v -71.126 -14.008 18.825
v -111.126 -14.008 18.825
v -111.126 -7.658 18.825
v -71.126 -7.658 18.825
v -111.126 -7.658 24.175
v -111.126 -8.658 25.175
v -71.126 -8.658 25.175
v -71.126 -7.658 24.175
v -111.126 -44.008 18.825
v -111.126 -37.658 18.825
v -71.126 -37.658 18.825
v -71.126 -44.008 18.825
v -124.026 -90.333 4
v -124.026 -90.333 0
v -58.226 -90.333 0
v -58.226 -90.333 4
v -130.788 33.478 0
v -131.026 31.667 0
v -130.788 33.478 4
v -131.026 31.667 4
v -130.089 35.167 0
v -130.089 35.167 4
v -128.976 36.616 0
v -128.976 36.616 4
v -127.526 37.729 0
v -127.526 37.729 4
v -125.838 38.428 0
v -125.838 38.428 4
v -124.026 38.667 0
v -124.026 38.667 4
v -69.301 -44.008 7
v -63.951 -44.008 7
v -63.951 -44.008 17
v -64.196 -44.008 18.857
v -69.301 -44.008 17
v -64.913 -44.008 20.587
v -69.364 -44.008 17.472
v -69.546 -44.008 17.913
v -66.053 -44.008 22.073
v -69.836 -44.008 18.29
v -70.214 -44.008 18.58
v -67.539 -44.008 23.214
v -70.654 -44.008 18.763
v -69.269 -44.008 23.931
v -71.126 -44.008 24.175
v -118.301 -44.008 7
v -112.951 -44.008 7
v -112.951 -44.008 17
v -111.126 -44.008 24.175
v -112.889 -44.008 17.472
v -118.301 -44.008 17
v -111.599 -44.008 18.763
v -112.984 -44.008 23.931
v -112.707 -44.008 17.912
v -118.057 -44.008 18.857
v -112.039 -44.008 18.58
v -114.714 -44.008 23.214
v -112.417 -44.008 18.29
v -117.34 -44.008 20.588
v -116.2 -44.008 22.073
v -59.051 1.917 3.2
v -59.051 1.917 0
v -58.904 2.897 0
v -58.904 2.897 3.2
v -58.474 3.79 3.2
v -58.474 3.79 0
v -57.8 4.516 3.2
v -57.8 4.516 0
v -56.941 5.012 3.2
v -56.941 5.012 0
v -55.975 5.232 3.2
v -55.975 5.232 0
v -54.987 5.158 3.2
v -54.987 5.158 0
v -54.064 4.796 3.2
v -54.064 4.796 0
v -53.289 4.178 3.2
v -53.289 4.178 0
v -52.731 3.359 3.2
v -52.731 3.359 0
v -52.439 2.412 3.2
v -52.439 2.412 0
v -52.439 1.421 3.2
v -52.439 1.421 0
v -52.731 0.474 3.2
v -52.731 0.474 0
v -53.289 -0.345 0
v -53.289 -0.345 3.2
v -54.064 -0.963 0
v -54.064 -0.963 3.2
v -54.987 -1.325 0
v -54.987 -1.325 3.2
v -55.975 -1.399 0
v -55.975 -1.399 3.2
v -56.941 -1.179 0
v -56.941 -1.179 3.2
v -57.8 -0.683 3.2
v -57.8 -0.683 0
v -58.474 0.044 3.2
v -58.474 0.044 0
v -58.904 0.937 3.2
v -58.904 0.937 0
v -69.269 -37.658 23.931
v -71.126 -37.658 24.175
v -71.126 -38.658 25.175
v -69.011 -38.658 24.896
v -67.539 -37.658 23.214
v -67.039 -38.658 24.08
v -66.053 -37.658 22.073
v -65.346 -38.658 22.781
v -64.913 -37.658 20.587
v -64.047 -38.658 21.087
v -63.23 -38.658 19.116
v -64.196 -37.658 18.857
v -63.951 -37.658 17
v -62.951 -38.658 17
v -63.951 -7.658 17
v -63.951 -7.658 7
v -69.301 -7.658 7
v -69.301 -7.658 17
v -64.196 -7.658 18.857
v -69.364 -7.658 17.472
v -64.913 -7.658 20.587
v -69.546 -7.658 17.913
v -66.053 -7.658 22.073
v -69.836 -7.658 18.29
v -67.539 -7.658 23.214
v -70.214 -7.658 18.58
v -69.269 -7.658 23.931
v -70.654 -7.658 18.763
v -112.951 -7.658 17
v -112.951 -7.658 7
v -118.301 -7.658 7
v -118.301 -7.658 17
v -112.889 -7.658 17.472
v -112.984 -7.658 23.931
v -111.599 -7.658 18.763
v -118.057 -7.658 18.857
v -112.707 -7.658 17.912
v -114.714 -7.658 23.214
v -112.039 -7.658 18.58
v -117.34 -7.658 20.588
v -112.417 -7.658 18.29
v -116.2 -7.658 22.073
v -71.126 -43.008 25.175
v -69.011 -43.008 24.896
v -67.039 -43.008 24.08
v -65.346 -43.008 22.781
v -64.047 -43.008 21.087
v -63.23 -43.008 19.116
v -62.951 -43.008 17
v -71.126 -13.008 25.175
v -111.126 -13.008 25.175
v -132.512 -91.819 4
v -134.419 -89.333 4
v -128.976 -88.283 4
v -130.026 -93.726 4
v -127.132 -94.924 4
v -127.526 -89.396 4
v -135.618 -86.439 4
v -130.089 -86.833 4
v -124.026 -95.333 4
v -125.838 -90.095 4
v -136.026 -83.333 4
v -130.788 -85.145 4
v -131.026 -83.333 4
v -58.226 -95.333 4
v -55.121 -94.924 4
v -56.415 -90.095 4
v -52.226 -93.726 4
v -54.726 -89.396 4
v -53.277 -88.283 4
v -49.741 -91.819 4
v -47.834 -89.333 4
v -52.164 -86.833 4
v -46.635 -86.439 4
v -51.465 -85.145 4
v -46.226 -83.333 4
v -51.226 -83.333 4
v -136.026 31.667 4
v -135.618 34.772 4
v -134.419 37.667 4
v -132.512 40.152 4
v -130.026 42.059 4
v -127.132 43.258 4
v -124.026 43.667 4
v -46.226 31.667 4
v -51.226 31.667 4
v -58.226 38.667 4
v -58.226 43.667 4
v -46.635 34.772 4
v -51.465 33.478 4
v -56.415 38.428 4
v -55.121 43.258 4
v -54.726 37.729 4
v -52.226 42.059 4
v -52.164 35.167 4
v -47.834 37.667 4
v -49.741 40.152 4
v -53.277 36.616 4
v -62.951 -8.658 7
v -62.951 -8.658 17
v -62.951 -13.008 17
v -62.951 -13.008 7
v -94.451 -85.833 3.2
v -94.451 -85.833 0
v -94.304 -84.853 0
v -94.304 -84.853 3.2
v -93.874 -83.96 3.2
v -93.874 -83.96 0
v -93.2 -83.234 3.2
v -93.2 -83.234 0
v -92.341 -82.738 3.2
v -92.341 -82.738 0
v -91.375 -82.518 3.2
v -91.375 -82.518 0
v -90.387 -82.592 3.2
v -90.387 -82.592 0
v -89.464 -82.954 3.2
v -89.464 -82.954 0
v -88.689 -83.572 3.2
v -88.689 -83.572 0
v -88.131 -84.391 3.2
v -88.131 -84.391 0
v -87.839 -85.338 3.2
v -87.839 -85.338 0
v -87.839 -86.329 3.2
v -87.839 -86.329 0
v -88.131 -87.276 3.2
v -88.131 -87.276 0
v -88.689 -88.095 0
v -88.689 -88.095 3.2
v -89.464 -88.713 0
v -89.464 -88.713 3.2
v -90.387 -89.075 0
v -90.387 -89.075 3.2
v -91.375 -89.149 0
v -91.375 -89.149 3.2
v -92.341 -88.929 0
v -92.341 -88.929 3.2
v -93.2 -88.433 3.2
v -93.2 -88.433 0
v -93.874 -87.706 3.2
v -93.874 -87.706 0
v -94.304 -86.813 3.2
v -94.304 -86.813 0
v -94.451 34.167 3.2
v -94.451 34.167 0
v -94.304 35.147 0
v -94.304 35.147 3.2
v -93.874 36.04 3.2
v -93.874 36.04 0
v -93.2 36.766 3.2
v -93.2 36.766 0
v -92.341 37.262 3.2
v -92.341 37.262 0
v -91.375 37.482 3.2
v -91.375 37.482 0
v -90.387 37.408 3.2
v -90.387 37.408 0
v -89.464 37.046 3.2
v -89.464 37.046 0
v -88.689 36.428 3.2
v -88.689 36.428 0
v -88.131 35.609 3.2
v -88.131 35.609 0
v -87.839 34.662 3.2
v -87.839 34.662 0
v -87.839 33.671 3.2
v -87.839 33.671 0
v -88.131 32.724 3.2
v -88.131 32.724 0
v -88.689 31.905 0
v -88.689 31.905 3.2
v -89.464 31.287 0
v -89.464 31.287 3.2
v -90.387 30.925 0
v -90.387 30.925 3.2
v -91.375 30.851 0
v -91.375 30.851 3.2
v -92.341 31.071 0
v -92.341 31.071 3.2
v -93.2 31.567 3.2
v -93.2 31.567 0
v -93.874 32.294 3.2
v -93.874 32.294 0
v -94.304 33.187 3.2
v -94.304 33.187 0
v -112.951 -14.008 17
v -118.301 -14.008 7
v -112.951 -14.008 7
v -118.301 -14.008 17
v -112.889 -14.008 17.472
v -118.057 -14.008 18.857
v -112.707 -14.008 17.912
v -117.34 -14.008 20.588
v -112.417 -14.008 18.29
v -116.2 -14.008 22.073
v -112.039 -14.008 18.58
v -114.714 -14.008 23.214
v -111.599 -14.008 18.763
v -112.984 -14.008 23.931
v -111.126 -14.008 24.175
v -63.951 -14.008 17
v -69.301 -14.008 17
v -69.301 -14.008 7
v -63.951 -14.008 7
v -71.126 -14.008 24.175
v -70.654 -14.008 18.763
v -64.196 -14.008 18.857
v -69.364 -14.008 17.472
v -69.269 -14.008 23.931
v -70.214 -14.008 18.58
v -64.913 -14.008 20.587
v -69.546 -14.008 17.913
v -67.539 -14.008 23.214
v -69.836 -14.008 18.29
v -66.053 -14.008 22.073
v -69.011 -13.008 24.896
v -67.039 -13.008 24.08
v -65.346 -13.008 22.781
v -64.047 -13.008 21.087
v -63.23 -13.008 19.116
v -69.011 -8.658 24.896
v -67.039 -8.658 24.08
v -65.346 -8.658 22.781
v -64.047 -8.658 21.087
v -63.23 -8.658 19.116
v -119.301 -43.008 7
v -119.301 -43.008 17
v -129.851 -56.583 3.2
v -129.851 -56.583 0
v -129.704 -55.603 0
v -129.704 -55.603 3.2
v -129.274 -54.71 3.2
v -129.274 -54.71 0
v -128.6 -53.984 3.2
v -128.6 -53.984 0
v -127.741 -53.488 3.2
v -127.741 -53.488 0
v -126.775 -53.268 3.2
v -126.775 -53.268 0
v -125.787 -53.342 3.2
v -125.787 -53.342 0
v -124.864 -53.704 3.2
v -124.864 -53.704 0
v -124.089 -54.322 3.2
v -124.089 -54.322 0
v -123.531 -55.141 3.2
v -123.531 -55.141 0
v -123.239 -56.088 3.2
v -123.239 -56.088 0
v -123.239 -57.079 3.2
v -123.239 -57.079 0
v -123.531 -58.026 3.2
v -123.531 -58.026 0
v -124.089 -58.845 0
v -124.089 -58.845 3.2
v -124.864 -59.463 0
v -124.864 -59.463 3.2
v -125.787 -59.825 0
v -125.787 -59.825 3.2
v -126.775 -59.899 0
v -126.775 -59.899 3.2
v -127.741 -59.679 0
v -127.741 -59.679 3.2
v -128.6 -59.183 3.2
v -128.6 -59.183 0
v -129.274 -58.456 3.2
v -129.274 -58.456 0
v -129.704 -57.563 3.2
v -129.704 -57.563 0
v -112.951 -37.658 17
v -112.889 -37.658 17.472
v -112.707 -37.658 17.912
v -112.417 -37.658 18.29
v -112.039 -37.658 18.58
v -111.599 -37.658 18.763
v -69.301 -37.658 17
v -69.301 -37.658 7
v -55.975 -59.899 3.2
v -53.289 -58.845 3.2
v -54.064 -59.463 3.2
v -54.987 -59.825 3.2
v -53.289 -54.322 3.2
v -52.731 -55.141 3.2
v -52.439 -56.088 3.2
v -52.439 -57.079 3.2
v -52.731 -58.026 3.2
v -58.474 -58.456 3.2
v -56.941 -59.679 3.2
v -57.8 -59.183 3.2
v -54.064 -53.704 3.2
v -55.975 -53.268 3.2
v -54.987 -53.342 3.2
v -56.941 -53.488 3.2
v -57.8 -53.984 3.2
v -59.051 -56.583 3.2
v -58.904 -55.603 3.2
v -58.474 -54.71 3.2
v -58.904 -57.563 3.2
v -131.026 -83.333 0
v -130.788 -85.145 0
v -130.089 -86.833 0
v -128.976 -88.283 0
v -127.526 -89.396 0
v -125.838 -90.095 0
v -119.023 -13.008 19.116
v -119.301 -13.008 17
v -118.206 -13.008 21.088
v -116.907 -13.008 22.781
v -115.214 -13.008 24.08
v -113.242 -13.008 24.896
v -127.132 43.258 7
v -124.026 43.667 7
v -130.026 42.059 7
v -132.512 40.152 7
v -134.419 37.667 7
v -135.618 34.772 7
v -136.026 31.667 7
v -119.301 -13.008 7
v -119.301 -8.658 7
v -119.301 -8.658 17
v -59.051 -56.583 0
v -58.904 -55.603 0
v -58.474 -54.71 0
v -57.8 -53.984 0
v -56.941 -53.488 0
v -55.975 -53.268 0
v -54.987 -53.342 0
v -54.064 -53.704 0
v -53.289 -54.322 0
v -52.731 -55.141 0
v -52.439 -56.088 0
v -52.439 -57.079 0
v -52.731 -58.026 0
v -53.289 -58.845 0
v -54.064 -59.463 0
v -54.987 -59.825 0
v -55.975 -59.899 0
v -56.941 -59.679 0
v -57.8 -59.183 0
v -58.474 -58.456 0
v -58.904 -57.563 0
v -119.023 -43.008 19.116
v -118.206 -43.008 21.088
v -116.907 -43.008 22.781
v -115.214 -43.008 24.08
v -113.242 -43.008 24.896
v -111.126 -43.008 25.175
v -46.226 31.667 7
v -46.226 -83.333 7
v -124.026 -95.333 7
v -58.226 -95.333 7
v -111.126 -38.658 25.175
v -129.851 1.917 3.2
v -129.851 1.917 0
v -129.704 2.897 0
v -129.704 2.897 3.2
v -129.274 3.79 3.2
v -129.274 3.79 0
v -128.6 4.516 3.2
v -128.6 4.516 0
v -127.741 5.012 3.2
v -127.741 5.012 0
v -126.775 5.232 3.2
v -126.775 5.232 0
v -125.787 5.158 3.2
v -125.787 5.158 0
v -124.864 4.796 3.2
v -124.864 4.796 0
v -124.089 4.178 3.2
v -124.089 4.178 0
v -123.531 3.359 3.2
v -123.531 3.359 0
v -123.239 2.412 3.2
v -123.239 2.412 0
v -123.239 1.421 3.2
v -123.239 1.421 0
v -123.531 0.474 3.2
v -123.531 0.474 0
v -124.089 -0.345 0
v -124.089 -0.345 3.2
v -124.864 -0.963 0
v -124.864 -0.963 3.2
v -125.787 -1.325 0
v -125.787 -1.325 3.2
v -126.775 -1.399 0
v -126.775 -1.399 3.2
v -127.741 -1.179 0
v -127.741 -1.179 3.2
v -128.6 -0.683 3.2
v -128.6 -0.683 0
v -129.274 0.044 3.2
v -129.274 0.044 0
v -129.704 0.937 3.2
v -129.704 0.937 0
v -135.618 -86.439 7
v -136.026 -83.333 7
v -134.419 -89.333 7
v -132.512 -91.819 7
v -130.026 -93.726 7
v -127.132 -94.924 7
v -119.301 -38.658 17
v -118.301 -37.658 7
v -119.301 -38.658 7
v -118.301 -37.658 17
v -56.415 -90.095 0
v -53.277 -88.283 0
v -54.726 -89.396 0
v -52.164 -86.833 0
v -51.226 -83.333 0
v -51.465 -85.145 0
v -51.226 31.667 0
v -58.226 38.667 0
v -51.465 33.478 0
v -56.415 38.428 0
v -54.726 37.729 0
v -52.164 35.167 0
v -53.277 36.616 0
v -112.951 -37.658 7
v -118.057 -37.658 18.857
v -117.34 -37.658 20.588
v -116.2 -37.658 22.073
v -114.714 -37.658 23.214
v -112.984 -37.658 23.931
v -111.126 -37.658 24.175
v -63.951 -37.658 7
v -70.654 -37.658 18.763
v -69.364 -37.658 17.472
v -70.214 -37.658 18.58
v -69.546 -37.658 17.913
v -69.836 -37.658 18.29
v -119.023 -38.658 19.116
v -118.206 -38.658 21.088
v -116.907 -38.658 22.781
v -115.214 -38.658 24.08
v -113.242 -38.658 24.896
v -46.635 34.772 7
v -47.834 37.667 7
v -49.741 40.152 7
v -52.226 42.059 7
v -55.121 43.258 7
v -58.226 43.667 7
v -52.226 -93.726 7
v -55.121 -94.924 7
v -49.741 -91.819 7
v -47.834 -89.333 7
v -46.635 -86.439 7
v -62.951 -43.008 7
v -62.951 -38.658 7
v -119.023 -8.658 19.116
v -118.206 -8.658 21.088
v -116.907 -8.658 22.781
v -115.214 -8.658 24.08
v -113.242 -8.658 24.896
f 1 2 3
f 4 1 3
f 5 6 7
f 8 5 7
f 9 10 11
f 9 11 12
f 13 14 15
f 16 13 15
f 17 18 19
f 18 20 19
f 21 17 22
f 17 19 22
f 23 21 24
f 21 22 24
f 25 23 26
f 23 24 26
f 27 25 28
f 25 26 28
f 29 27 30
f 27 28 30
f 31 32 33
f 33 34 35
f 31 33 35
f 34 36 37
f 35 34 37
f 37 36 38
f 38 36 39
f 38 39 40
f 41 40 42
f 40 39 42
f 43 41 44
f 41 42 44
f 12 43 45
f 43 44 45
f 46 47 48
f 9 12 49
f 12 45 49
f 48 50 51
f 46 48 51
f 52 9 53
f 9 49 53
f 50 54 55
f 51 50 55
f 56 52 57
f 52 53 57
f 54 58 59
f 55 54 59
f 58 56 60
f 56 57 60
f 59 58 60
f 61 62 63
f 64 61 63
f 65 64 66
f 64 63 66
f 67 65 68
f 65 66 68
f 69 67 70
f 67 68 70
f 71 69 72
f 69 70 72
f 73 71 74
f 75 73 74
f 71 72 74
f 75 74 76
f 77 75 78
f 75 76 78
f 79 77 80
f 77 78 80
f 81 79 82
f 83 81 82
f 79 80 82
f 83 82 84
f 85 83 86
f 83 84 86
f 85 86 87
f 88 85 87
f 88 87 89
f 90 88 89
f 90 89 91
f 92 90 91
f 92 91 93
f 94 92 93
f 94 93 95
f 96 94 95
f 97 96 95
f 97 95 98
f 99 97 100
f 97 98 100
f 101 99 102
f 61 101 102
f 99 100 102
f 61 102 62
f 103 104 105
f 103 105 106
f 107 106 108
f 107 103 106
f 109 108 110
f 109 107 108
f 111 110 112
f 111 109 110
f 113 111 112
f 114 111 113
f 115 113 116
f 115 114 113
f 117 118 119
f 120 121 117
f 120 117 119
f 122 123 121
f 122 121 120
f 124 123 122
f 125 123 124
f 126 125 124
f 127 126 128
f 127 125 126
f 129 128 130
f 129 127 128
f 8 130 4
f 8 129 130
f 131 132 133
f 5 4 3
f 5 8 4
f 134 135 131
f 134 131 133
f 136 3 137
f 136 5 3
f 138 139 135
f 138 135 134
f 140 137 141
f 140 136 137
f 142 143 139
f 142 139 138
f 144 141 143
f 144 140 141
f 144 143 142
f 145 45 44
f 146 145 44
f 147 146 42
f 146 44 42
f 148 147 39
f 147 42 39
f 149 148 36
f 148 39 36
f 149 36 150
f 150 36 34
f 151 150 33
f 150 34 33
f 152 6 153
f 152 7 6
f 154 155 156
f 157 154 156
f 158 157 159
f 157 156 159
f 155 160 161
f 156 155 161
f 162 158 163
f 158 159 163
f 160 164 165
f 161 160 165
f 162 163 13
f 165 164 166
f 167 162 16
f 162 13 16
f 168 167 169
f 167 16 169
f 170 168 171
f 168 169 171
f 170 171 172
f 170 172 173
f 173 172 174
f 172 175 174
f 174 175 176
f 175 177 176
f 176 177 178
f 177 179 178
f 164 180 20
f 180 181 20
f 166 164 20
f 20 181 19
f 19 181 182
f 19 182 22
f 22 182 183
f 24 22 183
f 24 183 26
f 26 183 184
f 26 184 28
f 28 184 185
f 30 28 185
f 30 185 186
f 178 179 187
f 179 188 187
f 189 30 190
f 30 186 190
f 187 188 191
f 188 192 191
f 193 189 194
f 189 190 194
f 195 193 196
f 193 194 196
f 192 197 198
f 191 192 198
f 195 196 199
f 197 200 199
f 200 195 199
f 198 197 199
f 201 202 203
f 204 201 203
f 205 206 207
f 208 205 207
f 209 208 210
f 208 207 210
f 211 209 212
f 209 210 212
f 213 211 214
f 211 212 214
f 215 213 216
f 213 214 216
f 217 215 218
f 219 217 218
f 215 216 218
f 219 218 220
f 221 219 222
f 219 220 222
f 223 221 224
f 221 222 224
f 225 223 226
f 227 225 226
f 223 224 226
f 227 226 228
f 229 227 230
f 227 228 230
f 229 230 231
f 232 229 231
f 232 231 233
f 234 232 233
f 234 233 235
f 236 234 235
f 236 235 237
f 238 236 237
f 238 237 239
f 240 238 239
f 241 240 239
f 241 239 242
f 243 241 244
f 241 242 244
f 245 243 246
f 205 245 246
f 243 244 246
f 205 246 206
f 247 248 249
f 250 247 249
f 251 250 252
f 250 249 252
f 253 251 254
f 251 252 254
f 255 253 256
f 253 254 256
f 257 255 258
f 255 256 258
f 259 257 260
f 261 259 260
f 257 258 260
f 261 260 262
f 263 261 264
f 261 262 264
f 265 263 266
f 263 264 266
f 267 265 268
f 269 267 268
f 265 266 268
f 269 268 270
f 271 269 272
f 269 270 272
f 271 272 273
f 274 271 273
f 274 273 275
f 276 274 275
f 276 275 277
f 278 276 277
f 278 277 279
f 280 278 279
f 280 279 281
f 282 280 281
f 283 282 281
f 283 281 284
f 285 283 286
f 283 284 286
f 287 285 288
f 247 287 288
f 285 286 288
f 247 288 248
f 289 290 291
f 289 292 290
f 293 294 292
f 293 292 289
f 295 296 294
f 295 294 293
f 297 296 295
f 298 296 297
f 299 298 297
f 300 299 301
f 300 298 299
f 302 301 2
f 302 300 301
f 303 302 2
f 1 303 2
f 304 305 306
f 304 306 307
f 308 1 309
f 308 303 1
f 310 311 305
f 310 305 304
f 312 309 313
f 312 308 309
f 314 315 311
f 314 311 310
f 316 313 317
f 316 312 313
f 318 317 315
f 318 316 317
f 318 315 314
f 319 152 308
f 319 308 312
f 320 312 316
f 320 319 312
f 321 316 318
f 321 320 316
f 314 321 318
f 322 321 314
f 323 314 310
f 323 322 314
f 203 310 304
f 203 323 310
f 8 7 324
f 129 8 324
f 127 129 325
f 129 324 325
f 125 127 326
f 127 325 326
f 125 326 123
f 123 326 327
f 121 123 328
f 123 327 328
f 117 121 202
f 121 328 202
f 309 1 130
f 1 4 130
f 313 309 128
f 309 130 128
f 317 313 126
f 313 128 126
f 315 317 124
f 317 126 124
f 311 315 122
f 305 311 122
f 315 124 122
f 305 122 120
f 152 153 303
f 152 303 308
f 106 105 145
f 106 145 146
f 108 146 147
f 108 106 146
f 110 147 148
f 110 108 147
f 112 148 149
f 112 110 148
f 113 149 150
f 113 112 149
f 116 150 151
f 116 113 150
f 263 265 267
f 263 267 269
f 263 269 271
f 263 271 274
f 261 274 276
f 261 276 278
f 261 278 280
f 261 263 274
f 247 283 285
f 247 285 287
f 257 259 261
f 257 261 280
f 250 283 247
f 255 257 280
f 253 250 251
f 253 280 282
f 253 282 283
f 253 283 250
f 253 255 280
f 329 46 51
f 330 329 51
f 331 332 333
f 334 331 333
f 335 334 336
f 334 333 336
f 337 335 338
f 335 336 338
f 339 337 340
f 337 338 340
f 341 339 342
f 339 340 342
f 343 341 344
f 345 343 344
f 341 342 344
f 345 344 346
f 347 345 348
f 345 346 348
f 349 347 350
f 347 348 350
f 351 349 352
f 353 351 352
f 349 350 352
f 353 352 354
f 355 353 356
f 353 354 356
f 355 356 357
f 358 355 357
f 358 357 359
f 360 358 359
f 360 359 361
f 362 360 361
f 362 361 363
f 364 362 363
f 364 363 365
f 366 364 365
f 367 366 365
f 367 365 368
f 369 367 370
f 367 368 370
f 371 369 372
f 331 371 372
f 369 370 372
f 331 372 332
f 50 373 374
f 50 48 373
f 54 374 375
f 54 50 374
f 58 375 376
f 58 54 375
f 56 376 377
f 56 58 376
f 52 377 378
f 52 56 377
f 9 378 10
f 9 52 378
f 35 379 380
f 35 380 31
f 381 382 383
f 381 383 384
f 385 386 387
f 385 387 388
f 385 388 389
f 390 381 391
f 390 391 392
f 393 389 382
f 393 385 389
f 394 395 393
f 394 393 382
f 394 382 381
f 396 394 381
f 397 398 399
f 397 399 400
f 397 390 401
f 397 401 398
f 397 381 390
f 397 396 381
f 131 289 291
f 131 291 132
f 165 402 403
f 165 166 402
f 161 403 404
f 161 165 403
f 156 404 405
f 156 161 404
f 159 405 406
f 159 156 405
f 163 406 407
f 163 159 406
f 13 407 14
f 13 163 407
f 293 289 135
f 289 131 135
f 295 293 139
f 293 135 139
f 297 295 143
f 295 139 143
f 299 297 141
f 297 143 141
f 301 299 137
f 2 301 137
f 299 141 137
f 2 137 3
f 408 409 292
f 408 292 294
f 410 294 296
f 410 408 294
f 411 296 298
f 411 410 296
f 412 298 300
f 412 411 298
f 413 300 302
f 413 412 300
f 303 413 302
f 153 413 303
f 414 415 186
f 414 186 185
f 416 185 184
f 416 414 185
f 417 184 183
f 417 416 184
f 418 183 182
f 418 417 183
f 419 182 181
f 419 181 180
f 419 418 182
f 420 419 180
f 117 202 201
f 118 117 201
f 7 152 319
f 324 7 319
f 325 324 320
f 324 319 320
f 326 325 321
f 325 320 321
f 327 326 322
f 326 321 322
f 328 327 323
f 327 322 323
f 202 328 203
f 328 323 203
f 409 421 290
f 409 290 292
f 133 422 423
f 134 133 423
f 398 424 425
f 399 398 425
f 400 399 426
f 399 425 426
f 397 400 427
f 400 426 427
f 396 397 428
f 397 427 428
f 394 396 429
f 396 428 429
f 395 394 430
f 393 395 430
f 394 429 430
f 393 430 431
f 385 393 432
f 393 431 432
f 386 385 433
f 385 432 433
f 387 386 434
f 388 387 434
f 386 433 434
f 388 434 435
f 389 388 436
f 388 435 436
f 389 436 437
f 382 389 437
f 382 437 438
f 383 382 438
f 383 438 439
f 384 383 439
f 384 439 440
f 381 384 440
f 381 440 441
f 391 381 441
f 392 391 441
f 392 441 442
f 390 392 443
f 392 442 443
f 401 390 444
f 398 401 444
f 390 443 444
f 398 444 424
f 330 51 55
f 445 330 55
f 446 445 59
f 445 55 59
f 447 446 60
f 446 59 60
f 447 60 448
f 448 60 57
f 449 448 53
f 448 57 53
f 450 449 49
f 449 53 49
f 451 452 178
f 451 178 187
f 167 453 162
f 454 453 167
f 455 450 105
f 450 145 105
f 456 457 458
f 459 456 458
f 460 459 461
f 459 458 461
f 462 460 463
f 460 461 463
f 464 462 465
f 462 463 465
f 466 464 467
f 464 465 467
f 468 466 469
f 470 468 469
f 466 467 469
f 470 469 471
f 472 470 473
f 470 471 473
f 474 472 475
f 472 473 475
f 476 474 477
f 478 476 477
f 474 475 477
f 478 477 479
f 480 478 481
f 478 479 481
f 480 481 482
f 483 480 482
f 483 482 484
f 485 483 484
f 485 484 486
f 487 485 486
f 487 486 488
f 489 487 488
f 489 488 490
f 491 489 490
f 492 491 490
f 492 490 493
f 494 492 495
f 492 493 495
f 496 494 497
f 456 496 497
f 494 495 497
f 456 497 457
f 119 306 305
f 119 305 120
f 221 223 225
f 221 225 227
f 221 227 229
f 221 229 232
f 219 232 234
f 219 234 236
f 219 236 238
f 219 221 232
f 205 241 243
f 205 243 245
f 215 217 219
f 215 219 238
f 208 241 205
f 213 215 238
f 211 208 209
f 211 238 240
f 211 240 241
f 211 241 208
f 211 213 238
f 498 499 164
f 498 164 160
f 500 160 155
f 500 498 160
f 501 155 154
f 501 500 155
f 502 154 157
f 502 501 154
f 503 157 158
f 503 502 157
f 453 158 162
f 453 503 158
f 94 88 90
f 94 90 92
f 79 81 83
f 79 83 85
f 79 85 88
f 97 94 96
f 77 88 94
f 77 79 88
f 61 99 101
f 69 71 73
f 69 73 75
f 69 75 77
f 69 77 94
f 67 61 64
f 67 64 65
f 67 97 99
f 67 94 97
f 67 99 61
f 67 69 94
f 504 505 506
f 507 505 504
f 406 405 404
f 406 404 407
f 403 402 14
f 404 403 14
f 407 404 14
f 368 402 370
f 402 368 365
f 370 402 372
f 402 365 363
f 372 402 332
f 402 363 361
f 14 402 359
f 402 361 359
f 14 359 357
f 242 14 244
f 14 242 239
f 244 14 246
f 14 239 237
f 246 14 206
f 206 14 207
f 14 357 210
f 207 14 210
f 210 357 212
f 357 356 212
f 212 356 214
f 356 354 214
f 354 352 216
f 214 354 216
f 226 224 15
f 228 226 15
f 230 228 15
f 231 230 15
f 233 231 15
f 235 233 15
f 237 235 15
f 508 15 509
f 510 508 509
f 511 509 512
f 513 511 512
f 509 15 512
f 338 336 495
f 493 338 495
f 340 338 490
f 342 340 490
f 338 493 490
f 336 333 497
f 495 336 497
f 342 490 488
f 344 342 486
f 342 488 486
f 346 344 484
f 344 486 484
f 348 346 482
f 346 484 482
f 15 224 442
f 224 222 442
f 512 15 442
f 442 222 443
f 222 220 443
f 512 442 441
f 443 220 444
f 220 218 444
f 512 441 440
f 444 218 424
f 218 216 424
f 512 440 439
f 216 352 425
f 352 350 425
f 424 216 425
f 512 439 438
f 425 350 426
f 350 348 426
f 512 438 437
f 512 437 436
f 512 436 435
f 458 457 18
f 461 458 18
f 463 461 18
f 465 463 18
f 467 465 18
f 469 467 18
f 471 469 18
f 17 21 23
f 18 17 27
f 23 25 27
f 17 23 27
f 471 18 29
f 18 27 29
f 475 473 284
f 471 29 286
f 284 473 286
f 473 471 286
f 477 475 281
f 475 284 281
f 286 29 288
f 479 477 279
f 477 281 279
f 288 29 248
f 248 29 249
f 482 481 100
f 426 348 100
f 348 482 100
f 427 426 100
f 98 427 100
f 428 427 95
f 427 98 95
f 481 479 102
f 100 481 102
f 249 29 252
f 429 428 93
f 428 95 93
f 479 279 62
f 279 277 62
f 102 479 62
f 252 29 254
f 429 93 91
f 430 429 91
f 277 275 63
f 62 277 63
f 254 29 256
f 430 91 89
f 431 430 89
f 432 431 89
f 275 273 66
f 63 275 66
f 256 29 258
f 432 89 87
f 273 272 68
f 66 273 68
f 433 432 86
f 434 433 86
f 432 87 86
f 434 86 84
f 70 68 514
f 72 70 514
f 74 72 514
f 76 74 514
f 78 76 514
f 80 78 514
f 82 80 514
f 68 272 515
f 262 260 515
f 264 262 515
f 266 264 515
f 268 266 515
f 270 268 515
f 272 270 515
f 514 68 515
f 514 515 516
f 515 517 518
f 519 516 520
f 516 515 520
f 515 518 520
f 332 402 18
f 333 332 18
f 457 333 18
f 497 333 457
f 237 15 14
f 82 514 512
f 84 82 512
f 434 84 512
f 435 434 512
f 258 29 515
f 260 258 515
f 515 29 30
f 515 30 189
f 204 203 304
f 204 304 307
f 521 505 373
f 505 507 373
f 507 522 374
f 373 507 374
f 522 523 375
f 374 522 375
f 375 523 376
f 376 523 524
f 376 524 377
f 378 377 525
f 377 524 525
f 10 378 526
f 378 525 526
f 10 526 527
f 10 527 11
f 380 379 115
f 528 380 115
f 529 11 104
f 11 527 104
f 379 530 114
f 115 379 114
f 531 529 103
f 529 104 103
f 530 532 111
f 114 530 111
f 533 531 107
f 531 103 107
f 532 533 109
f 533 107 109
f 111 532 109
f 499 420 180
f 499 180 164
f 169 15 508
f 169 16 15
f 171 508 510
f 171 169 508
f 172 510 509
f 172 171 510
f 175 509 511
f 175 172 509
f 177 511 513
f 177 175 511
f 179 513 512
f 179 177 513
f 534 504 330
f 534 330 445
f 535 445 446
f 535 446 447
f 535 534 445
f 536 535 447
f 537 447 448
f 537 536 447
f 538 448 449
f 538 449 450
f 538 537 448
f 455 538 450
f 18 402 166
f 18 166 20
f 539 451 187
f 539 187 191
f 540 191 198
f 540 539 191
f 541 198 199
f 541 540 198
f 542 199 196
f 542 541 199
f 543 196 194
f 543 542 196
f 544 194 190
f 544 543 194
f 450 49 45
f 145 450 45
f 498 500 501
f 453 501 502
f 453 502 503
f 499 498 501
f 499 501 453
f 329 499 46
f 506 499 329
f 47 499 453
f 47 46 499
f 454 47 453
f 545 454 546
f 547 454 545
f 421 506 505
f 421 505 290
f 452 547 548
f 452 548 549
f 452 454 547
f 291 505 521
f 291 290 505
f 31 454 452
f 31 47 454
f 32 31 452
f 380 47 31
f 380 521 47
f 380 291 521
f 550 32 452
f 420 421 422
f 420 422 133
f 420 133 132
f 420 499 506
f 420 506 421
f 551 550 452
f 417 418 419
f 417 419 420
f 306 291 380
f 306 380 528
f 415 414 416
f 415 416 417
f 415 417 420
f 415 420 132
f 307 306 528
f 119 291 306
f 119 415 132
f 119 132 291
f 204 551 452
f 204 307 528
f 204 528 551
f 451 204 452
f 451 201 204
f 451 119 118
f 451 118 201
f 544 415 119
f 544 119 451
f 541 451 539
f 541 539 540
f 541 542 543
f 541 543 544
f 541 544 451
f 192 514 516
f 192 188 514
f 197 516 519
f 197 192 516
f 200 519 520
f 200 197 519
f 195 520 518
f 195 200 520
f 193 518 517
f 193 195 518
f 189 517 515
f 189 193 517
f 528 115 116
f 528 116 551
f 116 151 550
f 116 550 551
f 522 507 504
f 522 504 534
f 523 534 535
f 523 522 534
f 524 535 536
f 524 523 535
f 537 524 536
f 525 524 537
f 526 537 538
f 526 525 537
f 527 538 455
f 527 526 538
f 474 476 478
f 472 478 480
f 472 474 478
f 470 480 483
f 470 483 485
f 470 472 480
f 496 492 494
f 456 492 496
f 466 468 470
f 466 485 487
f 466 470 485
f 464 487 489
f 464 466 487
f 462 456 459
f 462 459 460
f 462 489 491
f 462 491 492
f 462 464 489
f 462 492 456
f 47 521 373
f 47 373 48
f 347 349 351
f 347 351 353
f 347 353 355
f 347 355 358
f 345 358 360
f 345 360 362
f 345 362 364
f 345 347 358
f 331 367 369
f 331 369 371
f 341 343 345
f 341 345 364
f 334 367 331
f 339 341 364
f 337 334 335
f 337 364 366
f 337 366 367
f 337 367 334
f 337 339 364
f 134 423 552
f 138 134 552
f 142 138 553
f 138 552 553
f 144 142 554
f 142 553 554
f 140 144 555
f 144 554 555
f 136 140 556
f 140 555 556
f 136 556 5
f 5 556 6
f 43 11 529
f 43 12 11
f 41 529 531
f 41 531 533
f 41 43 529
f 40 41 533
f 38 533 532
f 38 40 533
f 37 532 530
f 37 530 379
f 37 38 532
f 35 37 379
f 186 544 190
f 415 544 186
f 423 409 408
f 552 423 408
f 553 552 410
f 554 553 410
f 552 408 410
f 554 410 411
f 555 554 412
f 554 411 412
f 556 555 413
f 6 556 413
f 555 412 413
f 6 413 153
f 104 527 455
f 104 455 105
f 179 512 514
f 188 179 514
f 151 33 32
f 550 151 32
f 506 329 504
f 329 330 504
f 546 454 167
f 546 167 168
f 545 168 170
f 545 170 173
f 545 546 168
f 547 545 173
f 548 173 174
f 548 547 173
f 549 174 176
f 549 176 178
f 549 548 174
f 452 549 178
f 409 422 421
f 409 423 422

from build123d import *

# Parameters (mm, degrees)
SKETCH1_W                = 79.8
SKETCH1_H                = 129
BOSS_EXTRUDE1_DEPTH      = 4
FILLET1_R                = 7
SKETCH2_R                = 3.325
CUT_EXTRUDE2_DEPTH       = 3.2
BOSS_EXTRUDE3_START      = 3
BOSS_EXTRUDE3_DEPTH      = 3
SKETCH6_W                = 6.35
SKETCH6_H                = 6.35
CHAMFER1_SIZE            = 1
CHAMFER1_OF_MIRROR1_SIZE = 1


with BuildPart() as part:
    # Sketch1 → Boss-Extrude1 (new body)
    with BuildSketch(Plane.XY):
        with Locations((-91.126473502, -25.83334618)):
            Rectangle(SKETCH1_W, SKETCH1_H)
    extrude(amount=BOSS_EXTRUDE1_DEPTH)

    # Fillet1
    fillet1_edges = [part.edges().sort_by_distance(p)[0] for p in [
        (-131.026473502, 38.66665382, 2),
        (-51.226473502, 38.66665382, 2),
        (-51.226473502, -90.33334618, 2),
        (-131.026473502, -90.33334618, 2),
    ]]
    fillet(fillet1_edges, radius=FILLET1_R)

    # Sketch2 → Cut-Extrude2 (cut)
    with BuildSketch(Plane(origin=(0, 0, 0), x_dir=(-1, 0, 0), z_dir=(0, 0, -1))):
        with Locations((55.726473502, 1.91665382)):
            Circle(SKETCH2_R)
        with Locations((91.126473502, 34.16665382)):
            Circle(SKETCH2_R)
        with Locations((55.726473502, -56.58334618)):
            Circle(SKETCH2_R)
        with Locations((91.126473502, -85.83334618)):
            Circle(SKETCH2_R)
        with Locations((126.526473502, 1.91665382)):
            Circle(SKETCH2_R)
        with Locations((126.526473502, -56.58334618)):
            Circle(SKETCH2_R)
    extrude(amount=-CUT_EXTRUDE2_DEPTH, mode=Mode.SUBTRACT)

    # Sketch3 → Boss-Extrude3 (add)
    # profile 1 of 3: a face of its own
    with BuildSketch(Plane.XY.offset(4).offset(BOSS_EXTRUDE3_START)):
        with BuildLine():
            Line((-136.026473502, 31.66665382), (-136.026473502, -83.33334618))
            ThreePointArc((-136.026473502, -83.33334618), (-132.511754876, -91.818627555), (-124.026473502, -95.33334618))
            Line((-124.026473502, -95.33334618), (-58.226473502, -95.33334618))
            ThreePointArc((-58.226473502, -95.33334618), (-49.741192128, -91.818627555), (-46.226473502, -83.33334618))
            Line((-46.226473502, -83.33334618), (-46.226473502, 31.66665382))
            ThreePointArc((-46.226473502, 31.66665382), (-49.741192128, 40.151935194), (-58.226473502, 43.66665382))
            Line((-58.226473502, 43.66665382), (-124.026473502, 43.66665382))
            ThreePointArc((-124.026473502, 43.66665382), (-132.511754876, 40.151935194), (-136.026473502, 31.66665382))
        make_face()
        with BuildLine():
            Line((-124.026473502, -90.33334618), (-58.226473502, -90.33334618))
            ThreePointArc((-58.226473502, -90.33334618), (-53.276726034, -88.283093649), (-51.226473502, -83.33334618))
            Line((-51.226473502, -83.33334618), (-51.226473502, 31.66665382))
            ThreePointArc((-51.226473502, 31.66665382), (-53.276726034, 36.616401288), (-58.226473502, 38.66665382))
            Line((-58.226473502, 38.66665382), (-124.026473502, 38.66665382))
            ThreePointArc((-124.026473502, 38.66665382), (-128.976220971, 36.616401288), (-131.026473502, 31.66665382))
            Line((-131.026473502, 31.66665382), (-131.026473502, -83.33334618))
            ThreePointArc((-131.026473502, -83.33334618), (-128.976220971, -88.283093649), (-124.026473502, -90.33334618))
        make_face(mode=Mode.SUBTRACT)
    # profile 2 of 3: a face of its own
    with BuildSketch(Plane.XY.offset(4).offset(BOSS_EXTRUDE3_START)):
        with BuildLine():
            ThreePointArc((-131.026473502, -83.33334618), (-128.976220971, -88.283093649), (-124.026473502, -90.33334618))
            Line((-124.026473502, -90.33334618), (-58.226473502, -90.33334618))
            ThreePointArc((-58.226473502, -90.33334618), (-53.276726034, -88.283093649), (-51.226473502, -83.33334618))
            Line((-51.226473502, -83.33334618), (-51.226473502, 31.66665382))
            ThreePointArc((-51.226473502, 31.66665382), (-53.276726034, 36.616401288), (-58.226473502, 38.66665382))
            Line((-58.226473502, 38.66665382), (-124.026473502, 38.66665382))
            ThreePointArc((-124.026473502, 38.66665382), (-128.976220971, 36.616401288), (-131.026473502, 31.66665382))
            Line((-131.026473502, 31.66665382), (-131.026473502, -83.33334618))
        make_face()
    # profile 3 of 3: a face of its own
    with BuildSketch(Plane.XY.offset(4).offset(BOSS_EXTRUDE3_START)):
        with BuildLine():
            Line((-124.026473502, -90.33334618), (-58.226473502, -90.33334618))
            ThreePointArc((-58.226473502, -90.33334618), (-53.276726034, -88.283093649), (-51.226473502, -83.33334618))
            Line((-51.226473502, -83.33334618), (-51.226473502, 31.66665382))
            ThreePointArc((-51.226473502, 31.66665382), (-53.276726034, 36.616401288), (-58.226473502, 38.66665382))
            Line((-58.226473502, 38.66665382), (-124.026473502, 38.66665382))
            ThreePointArc((-124.026473502, 38.66665382), (-128.976220971, 36.616401288), (-131.026473502, 31.66665382))
            Line((-131.026473502, 31.66665382), (-131.026473502, -83.33334618))
            ThreePointArc((-131.026473502, -83.33334618), (-128.976220971, -88.283093649), (-124.026473502, -90.33334618))
        make_face()
    extrude(amount=-BOSS_EXTRUDE3_DEPTH)

    # Sweep1: sweep along a curve in space
    with BuildLine() as sweep1_path:
        Line((-116.126473502, -10.83334618, 7), (-116.126473502, -10.83334618, 17))
        ThreePointArc((-116.126473502, -10.83334618, 17), (-114.662007408, -10.83334618, 20.535533906), (-111.126473502, -10.83334618, 22))
        Line((-111.126473502, -10.83334618, 22), (-71.126473502, -10.83334618, 22))
        ThreePointArc((-66.126473502, -10.83334618, 17), (-67.590939596, -10.83334618, 20.535533906), (-71.126473502, -10.83334618, 22))
        Line((-66.126473502, -10.83334618, 17), (-66.126473502, -10.83334618, 7))
    # Sketch6 → Sweep1 (sweep)
    with BuildSketch(Plane.XY.offset(7)):
        with Locations((-116.126473502, -10.83334618)):
            Rectangle(SKETCH6_W, SKETCH6_H)
    sweep1 = sweep(path=sweep1_path.line)

    # Chamfer1
    chamfer1_edges = [part.edges().sort_by_distance(p)[0] for p in [
        (-119.301473502, -14.00834618, 12),
        (-119.301473502, -7.65834618, 12),
        (-116.907071438, -14.00834618, 22.780597936),
        (-116.907071438, -7.65834618, 22.780597936),
        (-91.126473502, -14.00834618, 25.175),
        (-91.126473502, -7.65834618, 25.175),
        (-65.345875566, -14.00834618, 22.780597936),
        (-65.345875566, -7.65834618, 22.780597936),
        (-62.951473502, -14.00834618, 12),
        (-62.951473502, -7.65834618, 12),
    ]]
    chamfer(chamfer1_edges, length=CHAMFER1_SIZE)

    # Mirror1: Sweep1 across plane
    add(sweep1.mirror(Plane.ZX.offset(-25.83334618)))

    # Chamfer1 of Mirror1
    chamfer1_of_mirror1_edges = [part.edges().sort_by_distance(p)[0] for p in [
        (-119.301473502, -37.65834618, 12),
        (-119.301473502, -44.00834618, 12),
        (-116.907071438, -37.65834618, 22.780597936),
        (-116.907071438, -44.00834618, 22.780597936),
        (-91.126473502, -37.65834618, 25.175),
        (-91.126473502, -44.00834618, 25.175),
        (-65.345875566, -37.65834618, 22.780597936),
        (-65.345875566, -44.00834618, 22.780597936),
        (-62.951473502, -37.65834618, 12),
        (-62.951473502, -44.00834618, 12),
    ]]
    chamfer(chamfer1_of_mirror1_edges, length=CHAMFER1_OF_MIRROR1_SIZE)


solid = part.part
